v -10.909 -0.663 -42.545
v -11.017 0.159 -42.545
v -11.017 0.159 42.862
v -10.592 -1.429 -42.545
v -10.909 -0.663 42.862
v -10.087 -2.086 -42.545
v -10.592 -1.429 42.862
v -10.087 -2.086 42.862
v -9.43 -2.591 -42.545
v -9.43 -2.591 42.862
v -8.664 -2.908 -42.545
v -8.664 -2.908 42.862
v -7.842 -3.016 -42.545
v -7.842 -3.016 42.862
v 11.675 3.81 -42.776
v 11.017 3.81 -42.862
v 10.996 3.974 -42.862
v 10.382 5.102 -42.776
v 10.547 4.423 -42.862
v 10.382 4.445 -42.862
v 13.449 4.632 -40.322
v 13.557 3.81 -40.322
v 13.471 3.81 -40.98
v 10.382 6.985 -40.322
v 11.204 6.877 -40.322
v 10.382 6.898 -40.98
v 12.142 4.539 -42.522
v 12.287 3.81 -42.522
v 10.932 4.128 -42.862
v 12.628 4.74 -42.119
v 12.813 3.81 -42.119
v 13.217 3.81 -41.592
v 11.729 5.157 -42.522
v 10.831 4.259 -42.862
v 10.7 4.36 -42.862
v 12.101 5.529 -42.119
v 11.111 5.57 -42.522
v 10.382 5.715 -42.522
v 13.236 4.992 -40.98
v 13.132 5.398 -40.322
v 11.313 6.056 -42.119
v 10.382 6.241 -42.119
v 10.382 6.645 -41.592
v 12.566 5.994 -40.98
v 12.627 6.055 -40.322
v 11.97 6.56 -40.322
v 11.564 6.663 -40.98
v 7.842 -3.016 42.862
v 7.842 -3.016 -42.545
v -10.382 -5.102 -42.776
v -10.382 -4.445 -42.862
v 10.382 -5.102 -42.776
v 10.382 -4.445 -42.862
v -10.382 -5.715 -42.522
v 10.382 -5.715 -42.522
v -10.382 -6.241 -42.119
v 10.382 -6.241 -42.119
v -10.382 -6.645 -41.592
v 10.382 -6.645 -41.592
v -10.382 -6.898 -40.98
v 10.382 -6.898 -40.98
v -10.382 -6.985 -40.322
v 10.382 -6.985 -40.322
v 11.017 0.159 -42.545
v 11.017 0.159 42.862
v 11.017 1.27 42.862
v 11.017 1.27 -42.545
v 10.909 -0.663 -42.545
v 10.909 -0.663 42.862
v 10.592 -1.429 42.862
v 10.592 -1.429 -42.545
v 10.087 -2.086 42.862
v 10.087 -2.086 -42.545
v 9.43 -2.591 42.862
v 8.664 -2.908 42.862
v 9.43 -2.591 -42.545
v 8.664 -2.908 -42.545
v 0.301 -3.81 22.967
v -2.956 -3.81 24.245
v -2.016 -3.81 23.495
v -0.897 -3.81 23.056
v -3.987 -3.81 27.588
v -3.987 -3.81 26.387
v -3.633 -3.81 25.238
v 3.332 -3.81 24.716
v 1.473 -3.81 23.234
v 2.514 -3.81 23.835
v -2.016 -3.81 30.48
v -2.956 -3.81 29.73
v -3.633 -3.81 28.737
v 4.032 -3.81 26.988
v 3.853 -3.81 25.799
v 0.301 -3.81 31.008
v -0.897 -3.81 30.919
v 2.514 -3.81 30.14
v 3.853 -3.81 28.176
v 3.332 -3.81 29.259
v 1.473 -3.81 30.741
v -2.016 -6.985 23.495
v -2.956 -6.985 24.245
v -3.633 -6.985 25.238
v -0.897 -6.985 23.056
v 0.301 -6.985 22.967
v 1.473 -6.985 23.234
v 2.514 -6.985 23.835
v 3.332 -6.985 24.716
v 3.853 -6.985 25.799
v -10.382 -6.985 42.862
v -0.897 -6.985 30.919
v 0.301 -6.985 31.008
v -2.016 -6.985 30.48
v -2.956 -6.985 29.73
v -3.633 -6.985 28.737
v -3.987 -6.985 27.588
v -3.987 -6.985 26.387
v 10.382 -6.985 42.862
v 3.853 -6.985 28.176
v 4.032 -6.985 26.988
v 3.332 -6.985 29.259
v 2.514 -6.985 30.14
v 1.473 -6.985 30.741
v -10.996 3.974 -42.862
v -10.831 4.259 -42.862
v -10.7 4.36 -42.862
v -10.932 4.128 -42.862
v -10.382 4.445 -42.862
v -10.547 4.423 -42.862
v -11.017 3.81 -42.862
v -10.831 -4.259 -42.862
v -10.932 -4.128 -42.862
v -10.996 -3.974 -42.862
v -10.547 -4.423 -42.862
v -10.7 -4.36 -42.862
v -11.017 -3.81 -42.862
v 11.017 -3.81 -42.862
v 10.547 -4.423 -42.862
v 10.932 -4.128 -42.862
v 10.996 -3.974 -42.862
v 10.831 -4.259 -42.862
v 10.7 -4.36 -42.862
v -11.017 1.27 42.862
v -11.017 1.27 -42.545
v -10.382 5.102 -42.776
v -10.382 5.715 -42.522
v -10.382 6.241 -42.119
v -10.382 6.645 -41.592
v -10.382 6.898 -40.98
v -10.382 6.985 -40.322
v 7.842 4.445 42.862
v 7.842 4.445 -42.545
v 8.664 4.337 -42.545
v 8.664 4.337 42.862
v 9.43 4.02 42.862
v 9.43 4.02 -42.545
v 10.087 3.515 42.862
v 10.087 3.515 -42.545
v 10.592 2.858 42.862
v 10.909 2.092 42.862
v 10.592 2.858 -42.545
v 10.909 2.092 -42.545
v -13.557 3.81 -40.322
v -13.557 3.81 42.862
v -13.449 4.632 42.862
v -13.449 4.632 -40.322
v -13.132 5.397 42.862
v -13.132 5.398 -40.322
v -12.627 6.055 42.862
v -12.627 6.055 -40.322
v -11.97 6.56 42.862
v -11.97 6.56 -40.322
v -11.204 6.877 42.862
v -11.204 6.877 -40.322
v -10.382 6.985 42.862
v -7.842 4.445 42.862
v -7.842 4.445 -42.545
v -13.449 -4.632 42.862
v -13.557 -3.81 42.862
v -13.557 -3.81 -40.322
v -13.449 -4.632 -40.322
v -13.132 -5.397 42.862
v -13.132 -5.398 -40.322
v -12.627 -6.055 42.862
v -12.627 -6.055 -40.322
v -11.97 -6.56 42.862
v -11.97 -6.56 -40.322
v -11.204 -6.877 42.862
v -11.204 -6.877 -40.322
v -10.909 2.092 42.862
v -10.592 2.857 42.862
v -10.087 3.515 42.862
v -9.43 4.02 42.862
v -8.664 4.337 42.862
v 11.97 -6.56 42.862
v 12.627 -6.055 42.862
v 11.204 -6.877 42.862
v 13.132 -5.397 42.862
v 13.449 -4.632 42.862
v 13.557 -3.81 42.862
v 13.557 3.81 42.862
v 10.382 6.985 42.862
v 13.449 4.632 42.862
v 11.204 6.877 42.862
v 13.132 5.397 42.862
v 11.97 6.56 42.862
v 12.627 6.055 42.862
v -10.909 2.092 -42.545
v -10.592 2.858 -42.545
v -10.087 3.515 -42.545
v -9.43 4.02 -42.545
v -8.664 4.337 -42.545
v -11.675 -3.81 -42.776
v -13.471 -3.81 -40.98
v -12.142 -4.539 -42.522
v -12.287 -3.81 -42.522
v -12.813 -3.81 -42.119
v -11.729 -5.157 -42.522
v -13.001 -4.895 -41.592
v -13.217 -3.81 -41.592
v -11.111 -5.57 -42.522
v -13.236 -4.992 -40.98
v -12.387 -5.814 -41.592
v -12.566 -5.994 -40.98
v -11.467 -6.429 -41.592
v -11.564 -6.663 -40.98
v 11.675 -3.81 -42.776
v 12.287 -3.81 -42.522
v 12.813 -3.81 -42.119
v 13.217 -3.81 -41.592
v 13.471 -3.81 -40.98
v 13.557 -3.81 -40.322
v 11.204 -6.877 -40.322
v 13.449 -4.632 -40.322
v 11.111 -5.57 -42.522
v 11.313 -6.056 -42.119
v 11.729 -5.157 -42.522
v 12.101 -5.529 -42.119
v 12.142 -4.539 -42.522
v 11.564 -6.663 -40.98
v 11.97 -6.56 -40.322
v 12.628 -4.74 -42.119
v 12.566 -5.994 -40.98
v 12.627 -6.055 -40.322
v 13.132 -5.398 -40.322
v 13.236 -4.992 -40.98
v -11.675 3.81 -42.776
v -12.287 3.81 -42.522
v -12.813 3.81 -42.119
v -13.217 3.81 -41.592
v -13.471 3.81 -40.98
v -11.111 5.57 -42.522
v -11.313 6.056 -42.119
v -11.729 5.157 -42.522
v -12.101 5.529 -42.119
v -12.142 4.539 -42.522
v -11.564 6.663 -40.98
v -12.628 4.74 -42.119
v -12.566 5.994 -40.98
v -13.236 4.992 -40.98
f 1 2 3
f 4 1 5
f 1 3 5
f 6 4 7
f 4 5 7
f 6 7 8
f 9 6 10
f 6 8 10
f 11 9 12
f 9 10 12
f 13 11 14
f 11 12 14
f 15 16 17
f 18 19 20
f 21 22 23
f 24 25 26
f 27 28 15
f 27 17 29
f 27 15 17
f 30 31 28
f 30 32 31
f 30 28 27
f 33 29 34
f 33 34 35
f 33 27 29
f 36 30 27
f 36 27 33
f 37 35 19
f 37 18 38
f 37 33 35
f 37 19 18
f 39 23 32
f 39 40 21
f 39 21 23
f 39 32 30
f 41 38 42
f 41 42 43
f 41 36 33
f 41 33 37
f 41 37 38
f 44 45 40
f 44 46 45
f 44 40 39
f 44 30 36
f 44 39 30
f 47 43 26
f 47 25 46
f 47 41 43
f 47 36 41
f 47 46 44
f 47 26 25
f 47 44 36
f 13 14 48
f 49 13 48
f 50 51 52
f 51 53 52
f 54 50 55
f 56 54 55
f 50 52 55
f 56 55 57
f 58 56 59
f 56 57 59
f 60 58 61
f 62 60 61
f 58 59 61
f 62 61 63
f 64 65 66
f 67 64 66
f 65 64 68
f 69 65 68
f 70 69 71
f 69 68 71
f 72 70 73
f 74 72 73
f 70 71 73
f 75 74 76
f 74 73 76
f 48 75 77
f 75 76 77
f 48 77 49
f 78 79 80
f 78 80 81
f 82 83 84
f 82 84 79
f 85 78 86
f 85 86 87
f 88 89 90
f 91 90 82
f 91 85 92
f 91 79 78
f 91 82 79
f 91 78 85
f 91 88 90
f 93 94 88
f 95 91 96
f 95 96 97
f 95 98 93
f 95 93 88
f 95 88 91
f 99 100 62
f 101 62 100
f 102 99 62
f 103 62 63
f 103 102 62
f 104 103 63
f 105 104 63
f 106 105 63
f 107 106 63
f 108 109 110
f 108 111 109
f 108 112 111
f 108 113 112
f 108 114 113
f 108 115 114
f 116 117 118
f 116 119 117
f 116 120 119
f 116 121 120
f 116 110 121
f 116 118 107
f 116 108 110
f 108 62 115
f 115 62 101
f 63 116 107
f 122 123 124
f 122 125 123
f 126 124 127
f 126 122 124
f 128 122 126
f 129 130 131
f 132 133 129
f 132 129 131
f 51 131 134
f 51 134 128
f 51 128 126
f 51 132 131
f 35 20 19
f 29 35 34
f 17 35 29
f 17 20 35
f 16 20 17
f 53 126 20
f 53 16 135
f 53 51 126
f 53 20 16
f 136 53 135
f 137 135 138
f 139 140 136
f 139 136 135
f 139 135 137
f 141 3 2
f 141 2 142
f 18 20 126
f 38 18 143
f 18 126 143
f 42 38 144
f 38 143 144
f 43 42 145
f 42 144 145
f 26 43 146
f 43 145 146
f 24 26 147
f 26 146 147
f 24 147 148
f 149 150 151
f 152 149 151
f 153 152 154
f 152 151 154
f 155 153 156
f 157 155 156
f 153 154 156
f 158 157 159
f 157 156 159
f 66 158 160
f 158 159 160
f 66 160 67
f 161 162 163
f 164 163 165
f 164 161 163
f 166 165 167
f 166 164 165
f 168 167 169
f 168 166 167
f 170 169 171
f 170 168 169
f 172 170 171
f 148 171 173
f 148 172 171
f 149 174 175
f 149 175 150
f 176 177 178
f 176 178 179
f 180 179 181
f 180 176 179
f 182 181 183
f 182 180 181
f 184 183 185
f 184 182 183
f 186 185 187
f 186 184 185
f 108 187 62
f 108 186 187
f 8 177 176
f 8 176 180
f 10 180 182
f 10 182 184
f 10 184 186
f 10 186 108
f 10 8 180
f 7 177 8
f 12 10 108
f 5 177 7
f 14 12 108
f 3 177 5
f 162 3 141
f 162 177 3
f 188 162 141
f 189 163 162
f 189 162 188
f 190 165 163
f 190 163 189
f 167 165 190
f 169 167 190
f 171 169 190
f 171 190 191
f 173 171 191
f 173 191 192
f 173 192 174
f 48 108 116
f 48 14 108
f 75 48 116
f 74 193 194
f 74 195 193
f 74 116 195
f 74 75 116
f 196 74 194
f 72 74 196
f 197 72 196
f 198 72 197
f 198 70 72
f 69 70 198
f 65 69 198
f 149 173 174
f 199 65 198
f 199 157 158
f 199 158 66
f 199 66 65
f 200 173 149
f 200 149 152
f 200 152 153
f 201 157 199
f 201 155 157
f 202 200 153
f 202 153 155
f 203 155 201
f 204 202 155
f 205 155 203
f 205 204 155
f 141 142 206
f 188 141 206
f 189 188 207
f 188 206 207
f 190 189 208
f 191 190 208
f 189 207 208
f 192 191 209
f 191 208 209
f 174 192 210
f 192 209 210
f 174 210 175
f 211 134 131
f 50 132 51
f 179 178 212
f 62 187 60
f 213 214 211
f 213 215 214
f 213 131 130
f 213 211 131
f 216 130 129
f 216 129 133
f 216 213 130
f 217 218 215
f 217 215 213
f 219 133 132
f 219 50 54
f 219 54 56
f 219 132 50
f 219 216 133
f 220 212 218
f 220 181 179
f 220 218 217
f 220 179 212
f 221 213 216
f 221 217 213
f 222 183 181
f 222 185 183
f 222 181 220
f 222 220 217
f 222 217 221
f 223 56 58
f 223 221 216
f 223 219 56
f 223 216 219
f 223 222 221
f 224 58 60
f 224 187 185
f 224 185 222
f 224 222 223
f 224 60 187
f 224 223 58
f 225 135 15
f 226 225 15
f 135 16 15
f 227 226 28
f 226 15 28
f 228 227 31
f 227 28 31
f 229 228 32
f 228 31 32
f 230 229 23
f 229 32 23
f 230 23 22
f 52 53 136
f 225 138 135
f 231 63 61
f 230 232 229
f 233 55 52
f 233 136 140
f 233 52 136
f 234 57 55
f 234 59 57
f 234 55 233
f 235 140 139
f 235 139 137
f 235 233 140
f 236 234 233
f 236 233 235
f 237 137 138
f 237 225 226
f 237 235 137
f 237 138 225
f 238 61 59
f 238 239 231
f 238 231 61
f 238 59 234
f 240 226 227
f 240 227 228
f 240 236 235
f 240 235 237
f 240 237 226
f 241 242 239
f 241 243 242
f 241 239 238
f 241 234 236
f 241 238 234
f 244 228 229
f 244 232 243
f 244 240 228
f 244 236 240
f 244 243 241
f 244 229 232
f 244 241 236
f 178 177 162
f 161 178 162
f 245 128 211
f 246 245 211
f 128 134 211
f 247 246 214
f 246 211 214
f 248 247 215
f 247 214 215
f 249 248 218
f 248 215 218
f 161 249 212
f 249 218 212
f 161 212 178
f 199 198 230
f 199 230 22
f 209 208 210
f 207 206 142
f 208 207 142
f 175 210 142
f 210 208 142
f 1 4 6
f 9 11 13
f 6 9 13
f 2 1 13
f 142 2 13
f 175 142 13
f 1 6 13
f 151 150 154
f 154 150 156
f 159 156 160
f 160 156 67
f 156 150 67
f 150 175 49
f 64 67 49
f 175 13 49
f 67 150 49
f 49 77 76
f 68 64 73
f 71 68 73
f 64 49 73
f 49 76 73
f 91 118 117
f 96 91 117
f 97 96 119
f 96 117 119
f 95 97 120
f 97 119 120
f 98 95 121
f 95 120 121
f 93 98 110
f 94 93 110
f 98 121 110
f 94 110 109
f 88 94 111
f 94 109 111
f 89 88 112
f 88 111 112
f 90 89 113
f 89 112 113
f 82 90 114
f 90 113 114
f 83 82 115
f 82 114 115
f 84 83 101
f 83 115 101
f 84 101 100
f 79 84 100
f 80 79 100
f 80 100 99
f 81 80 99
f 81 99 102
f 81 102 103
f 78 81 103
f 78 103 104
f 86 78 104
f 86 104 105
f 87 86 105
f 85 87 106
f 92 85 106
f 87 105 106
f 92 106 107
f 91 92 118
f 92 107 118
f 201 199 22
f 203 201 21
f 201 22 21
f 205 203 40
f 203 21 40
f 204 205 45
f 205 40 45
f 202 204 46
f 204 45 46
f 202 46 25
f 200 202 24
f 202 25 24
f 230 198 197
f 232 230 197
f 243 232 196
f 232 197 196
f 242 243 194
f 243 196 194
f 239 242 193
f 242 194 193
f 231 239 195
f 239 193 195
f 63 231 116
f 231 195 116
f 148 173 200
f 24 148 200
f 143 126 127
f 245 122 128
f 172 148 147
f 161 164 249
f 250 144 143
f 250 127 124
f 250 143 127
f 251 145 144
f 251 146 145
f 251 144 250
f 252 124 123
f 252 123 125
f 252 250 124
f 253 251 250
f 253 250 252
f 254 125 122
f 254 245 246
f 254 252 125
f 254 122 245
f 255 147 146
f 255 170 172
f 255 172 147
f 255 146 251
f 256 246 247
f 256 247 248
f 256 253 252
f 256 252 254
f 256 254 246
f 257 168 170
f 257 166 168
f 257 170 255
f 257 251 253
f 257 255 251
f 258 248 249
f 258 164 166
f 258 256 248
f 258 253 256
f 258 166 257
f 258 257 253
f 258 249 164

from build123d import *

# Parameters (mm, degrees)
F0_W     = 27.1145
F0_H     = 13.97
F0_W_2   = 22.0345
F0_H_2   = 7.46125
F1_DEPTH = 42.8625
F2_R     = 3.175
F3_R     = 4.03225
F4_DEPTH = 3.175
F6_DEPTH = 0.3175
F7_R     = 2.54


with BuildPart() as f1:
    # F0 (on Top) → F1 (new body, symmetric)
    with BuildSketch(Plane.XY):
        Rectangle(F0_W, F0_H)
        with Locations((0, 0.714375)):
            Rectangle(F0_W_2, F0_H_2, mode=Mode.SUBTRACT)
    extrude(amount=F1_DEPTH, both=True)

    # F2
    f2_edges = [f1.edges().sort_by_distance(p)[0] for p in [
        (13.55725, -6.985, 0),
        (-13.55725, -6.985, 0),
        (-13.55725, 6.985, 0),
        (13.55725, 6.985, 0),
        (-11.01725, 4.445, 0),
        (11.01725, 4.445, 0),
        (11.01725, -3.01625, 0),
        (-11.01725, -3.01625, 0),
    ]]
    fillet(f2_edges, radius=F2_R)

    # F3 (on face) → F4 (cut)
    with BuildSketch(Plane.XZ.offset(6.985)):
        with Locations((0, 26.9875)):
            Circle(F3_R)
    extrude(amount=-F4_DEPTH, mode=Mode.SUBTRACT)

    # F5 (on face) → F6 (join)
    with BuildSketch(Plane(origin=(0, 0, -42.8625), x_dir=(1, 0, 0), z_dir=(0, 0, -1))):
        with BuildLine():
            ThreePointArc((11.01725, -0.15875), (10.0873140303, 2.0863140303), (7.84225, 3.01625))
            Line((7.84225, 3.01625), (-7.84225, 3.01625))
            ThreePointArc((-7.84225, 3.01625), (-10.0873140303, 2.0863140303), (-11.01725, -0.15875))
            Line((-11.01725, -0.15875), (-11.01725, -1.27))
            ThreePointArc((-11.01725, -1.27), (-10.0873140303, -3.5150640303), (-7.84225, -4.445))
            Line((-7.84225, -4.445), (7.84225, -4.445))
            ThreePointArc((7.84225, -4.445), (10.0873140303, -3.5150640303), (11.01725, -1.27))
            Line((11.01725, -1.27), (11.01725, -0.15875))
        make_face()
    extrude(amount=-F6_DEPTH)

    # F7
    f7_edges = [f1.edges().sort_by_distance(p)[0] for p in [
        (0, -6.985, -42.8625),
        (12.627314, -6.055064, -42.8625),
        (13.55725, 0, -42.8625),
        (12.627314, 6.055064, -42.8625),
        (0, 6.985, -42.8625),
        (-12.627314, 6.055064, -42.8625),
        (-13.55725, 0, -42.8625),
        (-12.627314, -6.055064, -42.8625),
    ]]
    fillet(f7_edges, radius=F7_R)


solid = f1.part
